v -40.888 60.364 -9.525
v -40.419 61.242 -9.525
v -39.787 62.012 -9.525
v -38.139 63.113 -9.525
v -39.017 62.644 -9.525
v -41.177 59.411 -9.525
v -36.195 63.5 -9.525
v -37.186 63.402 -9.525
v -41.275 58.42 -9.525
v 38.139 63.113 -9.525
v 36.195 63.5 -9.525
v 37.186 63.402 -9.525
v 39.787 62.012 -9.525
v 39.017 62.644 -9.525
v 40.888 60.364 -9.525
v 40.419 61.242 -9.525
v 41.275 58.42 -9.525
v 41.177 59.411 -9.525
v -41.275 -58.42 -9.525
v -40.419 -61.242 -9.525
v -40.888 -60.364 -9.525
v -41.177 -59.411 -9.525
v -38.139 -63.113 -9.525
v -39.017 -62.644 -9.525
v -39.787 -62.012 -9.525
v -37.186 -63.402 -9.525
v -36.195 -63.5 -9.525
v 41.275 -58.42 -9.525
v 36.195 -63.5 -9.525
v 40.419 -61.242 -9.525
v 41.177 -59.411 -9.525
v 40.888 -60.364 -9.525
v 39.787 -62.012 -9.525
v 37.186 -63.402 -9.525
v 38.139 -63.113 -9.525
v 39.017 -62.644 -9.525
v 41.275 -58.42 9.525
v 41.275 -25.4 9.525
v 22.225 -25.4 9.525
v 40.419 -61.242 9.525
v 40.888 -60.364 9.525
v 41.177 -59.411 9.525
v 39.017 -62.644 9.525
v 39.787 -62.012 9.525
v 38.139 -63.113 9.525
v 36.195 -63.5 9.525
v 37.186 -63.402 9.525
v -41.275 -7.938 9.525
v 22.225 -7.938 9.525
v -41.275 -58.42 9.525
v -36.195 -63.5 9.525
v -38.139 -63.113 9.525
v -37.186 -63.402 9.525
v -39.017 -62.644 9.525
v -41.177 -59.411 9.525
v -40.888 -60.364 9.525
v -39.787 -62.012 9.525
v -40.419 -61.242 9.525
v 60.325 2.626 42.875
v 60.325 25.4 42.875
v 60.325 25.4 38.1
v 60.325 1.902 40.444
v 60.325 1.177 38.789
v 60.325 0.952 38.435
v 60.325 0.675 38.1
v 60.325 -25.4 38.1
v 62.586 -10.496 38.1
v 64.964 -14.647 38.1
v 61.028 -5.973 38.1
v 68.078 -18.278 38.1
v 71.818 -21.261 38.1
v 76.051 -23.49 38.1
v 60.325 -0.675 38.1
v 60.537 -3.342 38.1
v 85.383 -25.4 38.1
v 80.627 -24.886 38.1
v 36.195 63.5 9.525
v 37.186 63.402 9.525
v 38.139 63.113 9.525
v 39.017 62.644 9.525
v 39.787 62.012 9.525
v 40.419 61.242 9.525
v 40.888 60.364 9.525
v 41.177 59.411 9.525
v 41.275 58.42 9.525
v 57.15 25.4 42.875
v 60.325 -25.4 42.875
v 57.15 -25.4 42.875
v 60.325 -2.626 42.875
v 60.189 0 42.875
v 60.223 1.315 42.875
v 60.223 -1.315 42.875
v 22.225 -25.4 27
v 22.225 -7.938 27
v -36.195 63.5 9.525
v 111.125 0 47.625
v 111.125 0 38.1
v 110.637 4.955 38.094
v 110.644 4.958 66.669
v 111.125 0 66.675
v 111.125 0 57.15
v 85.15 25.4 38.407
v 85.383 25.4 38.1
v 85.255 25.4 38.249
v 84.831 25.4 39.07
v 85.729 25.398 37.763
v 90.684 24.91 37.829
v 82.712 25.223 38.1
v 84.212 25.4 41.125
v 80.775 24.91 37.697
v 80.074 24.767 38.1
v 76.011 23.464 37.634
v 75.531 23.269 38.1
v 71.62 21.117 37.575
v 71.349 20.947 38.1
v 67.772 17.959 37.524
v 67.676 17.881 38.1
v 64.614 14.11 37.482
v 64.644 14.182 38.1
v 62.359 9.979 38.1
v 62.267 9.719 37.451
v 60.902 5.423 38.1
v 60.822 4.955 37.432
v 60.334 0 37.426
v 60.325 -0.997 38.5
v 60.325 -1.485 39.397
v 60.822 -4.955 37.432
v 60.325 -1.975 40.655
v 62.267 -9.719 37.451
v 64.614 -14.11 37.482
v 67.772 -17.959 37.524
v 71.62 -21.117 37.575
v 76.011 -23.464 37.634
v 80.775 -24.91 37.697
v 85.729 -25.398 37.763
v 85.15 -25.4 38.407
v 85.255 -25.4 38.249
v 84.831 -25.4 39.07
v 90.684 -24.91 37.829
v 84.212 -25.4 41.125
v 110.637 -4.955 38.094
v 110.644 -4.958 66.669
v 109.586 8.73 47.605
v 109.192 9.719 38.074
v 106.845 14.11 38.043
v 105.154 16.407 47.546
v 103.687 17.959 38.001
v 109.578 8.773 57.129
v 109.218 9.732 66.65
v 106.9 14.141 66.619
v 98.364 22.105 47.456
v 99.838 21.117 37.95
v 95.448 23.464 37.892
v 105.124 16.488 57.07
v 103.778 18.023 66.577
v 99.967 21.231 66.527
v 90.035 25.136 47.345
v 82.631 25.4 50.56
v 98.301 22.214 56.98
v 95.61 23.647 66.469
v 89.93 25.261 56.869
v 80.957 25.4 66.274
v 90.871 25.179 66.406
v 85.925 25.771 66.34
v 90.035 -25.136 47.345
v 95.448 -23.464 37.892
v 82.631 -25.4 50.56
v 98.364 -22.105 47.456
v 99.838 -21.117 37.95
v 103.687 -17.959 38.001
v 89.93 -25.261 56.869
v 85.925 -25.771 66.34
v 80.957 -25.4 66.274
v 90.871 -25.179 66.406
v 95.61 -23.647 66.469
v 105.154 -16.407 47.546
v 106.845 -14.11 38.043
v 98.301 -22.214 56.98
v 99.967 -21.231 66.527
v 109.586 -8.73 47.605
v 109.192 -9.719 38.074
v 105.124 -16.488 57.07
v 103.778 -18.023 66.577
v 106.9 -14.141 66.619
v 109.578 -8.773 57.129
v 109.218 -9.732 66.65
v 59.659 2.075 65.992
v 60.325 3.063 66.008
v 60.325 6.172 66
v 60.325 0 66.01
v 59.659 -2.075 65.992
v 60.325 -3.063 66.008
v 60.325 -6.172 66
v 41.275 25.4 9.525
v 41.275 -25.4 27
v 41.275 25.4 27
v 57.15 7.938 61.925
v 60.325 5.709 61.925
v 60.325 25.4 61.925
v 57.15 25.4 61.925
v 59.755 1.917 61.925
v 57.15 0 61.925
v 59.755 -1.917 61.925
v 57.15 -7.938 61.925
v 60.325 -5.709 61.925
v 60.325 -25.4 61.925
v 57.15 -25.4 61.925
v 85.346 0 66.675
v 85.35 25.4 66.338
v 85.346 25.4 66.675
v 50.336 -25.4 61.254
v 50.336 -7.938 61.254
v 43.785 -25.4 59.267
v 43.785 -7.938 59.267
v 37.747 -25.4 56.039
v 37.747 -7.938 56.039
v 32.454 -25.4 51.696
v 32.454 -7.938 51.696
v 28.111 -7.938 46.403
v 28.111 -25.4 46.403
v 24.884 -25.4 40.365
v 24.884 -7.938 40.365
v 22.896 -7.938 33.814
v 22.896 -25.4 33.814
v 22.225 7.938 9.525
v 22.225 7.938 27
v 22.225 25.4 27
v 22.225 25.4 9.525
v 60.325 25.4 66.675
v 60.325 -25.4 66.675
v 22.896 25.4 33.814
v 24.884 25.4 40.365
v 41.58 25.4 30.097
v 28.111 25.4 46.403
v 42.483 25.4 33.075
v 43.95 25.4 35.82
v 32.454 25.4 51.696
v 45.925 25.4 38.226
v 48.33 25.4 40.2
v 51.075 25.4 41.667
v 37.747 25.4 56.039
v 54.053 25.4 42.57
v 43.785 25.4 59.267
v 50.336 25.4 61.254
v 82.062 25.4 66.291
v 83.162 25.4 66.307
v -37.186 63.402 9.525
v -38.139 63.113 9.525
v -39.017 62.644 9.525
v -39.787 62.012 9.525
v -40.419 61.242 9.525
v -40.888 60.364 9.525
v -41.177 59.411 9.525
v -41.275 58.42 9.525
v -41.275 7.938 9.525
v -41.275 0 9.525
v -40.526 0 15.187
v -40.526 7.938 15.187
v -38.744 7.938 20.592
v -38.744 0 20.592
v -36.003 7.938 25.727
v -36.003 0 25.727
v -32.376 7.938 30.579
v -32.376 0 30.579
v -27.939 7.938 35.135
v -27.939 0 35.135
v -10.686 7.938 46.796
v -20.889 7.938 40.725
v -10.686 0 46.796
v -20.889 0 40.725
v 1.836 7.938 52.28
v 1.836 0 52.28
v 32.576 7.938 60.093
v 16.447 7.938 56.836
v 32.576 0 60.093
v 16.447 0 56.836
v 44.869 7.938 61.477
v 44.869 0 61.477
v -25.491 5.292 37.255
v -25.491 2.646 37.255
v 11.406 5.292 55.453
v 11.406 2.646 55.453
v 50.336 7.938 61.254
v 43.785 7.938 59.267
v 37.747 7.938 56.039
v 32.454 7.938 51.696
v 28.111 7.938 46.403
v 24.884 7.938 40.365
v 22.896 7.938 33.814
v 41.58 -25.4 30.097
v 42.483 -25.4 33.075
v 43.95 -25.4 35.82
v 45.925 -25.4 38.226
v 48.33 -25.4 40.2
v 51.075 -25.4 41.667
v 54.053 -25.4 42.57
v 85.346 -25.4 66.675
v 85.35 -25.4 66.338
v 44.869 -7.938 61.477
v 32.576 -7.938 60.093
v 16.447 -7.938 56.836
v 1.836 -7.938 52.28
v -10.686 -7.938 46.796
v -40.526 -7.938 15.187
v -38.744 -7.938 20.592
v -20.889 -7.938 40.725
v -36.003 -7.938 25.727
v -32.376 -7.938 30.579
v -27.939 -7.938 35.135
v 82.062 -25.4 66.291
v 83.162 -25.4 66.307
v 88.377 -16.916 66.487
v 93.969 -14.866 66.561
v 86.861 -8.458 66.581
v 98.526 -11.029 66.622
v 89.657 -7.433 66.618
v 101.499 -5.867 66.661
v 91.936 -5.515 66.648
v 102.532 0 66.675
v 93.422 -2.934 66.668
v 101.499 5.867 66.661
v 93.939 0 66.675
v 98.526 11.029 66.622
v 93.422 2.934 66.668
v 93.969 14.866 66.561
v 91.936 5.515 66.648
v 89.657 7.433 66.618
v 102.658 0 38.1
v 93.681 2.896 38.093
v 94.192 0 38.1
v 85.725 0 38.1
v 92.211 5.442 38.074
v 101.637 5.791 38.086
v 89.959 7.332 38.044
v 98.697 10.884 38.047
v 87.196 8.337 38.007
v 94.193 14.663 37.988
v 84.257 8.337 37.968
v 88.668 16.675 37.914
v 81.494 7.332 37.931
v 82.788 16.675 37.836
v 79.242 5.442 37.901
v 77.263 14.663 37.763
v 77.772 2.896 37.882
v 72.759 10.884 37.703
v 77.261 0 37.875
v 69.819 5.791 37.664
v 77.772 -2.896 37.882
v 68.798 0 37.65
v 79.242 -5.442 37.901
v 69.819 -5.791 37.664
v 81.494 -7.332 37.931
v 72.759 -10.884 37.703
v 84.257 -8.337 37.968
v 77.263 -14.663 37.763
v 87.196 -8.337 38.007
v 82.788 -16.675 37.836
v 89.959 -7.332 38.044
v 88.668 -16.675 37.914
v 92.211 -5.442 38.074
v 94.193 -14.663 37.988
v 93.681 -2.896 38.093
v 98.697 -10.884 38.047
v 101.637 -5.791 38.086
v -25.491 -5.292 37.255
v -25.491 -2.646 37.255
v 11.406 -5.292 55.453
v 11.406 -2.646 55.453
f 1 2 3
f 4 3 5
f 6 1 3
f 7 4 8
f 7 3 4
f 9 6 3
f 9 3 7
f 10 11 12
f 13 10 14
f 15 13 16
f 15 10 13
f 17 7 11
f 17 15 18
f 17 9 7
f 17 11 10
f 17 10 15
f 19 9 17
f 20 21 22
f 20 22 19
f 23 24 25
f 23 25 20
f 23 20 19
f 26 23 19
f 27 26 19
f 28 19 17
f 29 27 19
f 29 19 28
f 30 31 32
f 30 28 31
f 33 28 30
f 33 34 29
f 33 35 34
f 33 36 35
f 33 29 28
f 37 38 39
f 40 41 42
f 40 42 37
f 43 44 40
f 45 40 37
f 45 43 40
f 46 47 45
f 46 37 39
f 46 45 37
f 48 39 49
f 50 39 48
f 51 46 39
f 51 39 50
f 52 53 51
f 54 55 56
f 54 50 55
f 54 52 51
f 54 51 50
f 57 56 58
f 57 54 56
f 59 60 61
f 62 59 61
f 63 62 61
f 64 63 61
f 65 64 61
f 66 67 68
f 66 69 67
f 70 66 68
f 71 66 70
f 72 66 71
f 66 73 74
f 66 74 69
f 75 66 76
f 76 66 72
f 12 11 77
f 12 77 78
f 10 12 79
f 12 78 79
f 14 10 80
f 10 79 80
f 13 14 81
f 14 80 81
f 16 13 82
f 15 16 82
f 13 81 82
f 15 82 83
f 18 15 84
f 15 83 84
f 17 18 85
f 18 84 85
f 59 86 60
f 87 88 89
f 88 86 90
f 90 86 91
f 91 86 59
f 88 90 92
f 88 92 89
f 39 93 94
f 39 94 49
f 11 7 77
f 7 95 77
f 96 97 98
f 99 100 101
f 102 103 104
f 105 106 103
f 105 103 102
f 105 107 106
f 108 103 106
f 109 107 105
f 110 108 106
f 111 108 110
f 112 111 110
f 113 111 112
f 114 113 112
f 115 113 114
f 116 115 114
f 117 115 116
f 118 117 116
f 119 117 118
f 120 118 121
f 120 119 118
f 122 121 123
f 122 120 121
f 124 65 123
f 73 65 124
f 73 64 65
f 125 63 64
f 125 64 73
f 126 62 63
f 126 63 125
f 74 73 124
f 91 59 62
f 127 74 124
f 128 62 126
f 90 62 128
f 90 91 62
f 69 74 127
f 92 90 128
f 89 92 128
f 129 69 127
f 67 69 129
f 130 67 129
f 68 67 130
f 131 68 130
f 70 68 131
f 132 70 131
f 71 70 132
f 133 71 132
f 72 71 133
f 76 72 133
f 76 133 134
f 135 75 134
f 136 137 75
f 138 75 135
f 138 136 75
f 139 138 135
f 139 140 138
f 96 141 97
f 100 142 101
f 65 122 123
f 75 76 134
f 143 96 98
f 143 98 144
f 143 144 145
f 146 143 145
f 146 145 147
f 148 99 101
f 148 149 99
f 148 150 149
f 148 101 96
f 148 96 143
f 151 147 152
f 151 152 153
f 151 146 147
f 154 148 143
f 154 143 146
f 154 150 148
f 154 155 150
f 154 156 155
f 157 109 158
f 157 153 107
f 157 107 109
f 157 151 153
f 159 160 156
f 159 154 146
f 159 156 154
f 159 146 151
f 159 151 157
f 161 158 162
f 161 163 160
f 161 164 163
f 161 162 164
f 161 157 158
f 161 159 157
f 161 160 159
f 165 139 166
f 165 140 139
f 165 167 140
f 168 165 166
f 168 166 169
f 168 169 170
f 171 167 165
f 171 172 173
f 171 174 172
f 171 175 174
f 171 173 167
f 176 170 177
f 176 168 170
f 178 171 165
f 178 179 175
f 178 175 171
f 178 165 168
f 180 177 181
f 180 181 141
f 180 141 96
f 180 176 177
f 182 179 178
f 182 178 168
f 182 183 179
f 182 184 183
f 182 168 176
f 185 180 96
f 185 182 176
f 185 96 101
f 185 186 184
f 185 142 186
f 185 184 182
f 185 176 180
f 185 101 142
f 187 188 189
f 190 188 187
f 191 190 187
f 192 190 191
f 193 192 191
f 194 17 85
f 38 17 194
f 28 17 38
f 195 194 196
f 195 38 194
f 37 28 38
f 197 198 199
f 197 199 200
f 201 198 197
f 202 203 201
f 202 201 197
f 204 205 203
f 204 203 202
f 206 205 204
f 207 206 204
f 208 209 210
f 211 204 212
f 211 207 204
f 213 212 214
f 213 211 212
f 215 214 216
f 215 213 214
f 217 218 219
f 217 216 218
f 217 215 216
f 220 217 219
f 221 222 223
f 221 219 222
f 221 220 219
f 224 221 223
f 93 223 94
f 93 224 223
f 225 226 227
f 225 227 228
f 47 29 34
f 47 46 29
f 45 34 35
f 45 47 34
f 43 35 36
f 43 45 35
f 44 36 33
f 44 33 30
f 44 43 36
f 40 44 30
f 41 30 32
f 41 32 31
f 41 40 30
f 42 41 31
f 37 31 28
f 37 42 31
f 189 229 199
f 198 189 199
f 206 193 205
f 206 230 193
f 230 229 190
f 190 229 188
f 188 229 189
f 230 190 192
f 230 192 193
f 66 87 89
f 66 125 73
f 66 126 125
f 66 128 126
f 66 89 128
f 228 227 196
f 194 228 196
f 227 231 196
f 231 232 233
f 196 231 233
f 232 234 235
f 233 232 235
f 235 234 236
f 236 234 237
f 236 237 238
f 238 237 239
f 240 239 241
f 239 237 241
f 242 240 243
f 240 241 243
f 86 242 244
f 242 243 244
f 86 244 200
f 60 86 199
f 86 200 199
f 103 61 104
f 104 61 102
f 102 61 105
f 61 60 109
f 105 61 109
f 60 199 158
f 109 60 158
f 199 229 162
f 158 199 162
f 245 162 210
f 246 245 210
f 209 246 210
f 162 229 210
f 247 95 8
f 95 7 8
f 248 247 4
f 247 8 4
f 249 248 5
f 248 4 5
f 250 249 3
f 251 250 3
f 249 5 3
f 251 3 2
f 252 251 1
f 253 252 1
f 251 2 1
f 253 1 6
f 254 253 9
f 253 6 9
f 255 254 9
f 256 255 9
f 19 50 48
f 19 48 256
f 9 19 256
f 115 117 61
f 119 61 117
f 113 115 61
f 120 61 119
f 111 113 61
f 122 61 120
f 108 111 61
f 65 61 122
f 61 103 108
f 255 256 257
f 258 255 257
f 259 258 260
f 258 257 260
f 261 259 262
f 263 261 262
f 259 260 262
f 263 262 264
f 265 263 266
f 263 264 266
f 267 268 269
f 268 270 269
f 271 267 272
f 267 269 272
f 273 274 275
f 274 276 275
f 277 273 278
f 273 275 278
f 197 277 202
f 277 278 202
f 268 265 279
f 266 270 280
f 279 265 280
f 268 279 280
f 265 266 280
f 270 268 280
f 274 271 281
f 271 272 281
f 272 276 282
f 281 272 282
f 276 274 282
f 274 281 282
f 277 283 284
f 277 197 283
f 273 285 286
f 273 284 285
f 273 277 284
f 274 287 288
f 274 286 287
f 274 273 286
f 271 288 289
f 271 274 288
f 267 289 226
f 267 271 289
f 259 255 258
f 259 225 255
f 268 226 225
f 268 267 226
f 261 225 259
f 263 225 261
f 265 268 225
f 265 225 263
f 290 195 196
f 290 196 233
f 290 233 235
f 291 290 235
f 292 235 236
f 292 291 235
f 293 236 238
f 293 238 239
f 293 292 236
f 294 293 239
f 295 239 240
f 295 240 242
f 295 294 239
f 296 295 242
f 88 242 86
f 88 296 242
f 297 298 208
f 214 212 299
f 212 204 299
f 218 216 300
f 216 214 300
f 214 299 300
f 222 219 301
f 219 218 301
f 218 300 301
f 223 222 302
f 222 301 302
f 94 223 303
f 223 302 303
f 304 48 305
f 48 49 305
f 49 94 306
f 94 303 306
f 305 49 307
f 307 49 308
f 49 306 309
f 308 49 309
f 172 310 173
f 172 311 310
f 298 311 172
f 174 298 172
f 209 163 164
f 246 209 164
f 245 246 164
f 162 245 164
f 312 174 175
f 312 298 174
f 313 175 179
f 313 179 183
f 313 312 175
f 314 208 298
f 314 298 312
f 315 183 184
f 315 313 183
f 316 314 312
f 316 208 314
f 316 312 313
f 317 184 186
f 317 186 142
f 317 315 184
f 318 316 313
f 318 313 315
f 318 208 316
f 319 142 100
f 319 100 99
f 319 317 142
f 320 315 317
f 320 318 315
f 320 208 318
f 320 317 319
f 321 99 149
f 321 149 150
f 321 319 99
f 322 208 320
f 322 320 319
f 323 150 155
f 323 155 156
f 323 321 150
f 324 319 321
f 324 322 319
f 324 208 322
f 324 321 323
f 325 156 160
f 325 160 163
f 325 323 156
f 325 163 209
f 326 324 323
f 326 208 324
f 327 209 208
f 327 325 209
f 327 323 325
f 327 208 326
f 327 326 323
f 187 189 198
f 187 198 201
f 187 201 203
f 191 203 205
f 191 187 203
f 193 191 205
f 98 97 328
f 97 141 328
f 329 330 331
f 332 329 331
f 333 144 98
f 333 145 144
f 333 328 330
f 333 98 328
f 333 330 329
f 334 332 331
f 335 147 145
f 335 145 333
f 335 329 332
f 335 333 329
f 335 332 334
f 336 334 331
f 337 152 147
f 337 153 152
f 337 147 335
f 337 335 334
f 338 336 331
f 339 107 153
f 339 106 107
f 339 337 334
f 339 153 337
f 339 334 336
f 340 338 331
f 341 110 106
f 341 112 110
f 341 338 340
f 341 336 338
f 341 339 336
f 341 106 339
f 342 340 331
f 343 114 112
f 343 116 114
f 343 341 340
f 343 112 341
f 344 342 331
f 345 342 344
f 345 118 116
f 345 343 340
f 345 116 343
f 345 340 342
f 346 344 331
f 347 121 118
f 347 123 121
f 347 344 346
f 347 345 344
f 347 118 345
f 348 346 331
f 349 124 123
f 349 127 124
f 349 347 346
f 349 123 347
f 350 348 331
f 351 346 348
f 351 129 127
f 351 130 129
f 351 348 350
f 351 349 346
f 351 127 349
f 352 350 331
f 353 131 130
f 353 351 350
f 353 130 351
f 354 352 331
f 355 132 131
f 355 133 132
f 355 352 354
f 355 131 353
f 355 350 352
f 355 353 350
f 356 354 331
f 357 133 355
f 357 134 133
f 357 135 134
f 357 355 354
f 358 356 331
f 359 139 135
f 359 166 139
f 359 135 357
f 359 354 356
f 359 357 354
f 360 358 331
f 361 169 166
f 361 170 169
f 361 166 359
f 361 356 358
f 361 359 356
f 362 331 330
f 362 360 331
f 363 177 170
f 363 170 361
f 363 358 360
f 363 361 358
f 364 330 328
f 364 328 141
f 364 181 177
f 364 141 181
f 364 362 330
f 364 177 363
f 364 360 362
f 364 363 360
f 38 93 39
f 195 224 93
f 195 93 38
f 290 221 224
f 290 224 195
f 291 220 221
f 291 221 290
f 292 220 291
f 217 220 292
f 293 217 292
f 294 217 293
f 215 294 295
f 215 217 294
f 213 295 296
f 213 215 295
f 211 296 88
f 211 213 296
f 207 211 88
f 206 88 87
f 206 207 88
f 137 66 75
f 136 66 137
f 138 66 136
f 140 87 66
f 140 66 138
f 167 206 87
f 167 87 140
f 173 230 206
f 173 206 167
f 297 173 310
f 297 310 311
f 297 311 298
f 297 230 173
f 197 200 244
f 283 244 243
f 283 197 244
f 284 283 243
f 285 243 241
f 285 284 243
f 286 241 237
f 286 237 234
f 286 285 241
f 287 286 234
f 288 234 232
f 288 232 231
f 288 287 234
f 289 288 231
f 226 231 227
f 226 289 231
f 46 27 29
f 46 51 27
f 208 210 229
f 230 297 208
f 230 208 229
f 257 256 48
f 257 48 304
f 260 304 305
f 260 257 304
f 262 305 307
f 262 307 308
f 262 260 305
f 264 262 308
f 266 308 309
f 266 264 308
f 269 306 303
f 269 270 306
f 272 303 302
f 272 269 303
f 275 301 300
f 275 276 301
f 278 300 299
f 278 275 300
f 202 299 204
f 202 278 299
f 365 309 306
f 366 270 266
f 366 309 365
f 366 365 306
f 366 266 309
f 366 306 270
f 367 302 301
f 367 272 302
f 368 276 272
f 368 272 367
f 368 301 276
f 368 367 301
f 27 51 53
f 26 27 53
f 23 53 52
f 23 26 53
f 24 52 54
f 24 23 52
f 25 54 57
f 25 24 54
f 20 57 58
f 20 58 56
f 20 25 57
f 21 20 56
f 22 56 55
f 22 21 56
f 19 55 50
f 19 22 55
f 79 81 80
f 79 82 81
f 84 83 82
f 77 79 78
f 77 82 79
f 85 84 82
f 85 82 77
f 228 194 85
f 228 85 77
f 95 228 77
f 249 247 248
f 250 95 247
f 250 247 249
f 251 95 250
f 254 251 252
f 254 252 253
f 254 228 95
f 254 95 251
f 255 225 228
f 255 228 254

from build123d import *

# Parameters (mm, degrees)
F1_DEPTH = 63.5
F2_DEPTH = 25.4
F3_DEPTH = 7.9375
F5_R     = 5.08


with BuildPart() as f1:
    # F0 (on Front) → F1 (new body, symmetric)
    with BuildSketch(Plane.XZ):
        Polygon((-41.275, 9.525), (-41.275, -9.525), (41.275, -9.525), (41.275, 9.525), (22.225, 9.525), align=None)
    extrude(amount=F1_DEPTH, both=True)

    # F0 (on Front) → F2 (join, symmetric)
    with BuildSketch(Plane.XZ):
        with BuildLine():
            Line((22.225, 9.525), (41.275, 9.525))
            Line((41.275, 9.525), (41.275, 27.0002))
            ThreePointArc((41.275, 27.0002), (45.9246798487, 38.2255201513), (57.15, 42.8752))
            Line((57.15, 42.8752), (60.325, 42.8752))
            Line((60.325, 42.8752), (60.325, 61.9252))
            Line((60.325, 61.9252), (57.15, 61.9252))
            ThreePointArc((57.15, 61.9252), (32.4542956671, 51.6959043329), (22.225, 27.0002))
            Line((22.225, 27.0002), (22.225, 9.525))
        make_face()
        Polygon((60.325, 66.675), (60.325, 61.9252), (60.325, 42.8752), (60.325, 38.1), (85.725, 38.1), (85.3455588222, 66.675), align=None)
    extrude(amount=F2_DEPTH, both=True)

    # F0 (on Front) → F3 (join, symmetric)
    with BuildSketch(Plane.XZ):
        with BuildLine():
            add(Edge.make_bspline(
                [(-41.275, 9.525), (-40.1354804635, 41.2887968123), (11.0718579963, 62.0485283434), (57.15, 61.9252)],
                knots=[0, 0, 0, 0, 111.5045361635, 111.5045361635, 111.5045361635, 111.5045361635], degree=3))
            Line((-41.275, 9.525), (22.225, 9.525))
            Line((22.225, 9.525), (22.225, 27.0002))
            ThreePointArc((22.225, 27.0002), (32.4542956671, 51.6959043329), (57.15, 61.9252))
        make_face()
    extrude(amount=F3_DEPTH, both=True)

    # F0 (on Front) → F4 (revolve)
    with BuildSketch(Plane.XZ):
        Polygon((111.125, 66.675), (85.3455588222, 66.675), (85.725, 38.1), (111.125, 38.1), align=None)
    revolve(axis=Axis((85.5352794111, 0, 52.3875), (-0.0132776108, 0, 0.9999118486)))

    # F5
    f5_edges = [f1.edges().sort_by_distance(p)[0] for p in [
        (41.275, -63.5, 0),
        (41.275, 63.5, 0),
        (-41.275, 63.5, 0),
        (-41.275, -63.5, 0),
    ]]
    fillet(f5_edges, radius=F5_R)


solid = f1.part
